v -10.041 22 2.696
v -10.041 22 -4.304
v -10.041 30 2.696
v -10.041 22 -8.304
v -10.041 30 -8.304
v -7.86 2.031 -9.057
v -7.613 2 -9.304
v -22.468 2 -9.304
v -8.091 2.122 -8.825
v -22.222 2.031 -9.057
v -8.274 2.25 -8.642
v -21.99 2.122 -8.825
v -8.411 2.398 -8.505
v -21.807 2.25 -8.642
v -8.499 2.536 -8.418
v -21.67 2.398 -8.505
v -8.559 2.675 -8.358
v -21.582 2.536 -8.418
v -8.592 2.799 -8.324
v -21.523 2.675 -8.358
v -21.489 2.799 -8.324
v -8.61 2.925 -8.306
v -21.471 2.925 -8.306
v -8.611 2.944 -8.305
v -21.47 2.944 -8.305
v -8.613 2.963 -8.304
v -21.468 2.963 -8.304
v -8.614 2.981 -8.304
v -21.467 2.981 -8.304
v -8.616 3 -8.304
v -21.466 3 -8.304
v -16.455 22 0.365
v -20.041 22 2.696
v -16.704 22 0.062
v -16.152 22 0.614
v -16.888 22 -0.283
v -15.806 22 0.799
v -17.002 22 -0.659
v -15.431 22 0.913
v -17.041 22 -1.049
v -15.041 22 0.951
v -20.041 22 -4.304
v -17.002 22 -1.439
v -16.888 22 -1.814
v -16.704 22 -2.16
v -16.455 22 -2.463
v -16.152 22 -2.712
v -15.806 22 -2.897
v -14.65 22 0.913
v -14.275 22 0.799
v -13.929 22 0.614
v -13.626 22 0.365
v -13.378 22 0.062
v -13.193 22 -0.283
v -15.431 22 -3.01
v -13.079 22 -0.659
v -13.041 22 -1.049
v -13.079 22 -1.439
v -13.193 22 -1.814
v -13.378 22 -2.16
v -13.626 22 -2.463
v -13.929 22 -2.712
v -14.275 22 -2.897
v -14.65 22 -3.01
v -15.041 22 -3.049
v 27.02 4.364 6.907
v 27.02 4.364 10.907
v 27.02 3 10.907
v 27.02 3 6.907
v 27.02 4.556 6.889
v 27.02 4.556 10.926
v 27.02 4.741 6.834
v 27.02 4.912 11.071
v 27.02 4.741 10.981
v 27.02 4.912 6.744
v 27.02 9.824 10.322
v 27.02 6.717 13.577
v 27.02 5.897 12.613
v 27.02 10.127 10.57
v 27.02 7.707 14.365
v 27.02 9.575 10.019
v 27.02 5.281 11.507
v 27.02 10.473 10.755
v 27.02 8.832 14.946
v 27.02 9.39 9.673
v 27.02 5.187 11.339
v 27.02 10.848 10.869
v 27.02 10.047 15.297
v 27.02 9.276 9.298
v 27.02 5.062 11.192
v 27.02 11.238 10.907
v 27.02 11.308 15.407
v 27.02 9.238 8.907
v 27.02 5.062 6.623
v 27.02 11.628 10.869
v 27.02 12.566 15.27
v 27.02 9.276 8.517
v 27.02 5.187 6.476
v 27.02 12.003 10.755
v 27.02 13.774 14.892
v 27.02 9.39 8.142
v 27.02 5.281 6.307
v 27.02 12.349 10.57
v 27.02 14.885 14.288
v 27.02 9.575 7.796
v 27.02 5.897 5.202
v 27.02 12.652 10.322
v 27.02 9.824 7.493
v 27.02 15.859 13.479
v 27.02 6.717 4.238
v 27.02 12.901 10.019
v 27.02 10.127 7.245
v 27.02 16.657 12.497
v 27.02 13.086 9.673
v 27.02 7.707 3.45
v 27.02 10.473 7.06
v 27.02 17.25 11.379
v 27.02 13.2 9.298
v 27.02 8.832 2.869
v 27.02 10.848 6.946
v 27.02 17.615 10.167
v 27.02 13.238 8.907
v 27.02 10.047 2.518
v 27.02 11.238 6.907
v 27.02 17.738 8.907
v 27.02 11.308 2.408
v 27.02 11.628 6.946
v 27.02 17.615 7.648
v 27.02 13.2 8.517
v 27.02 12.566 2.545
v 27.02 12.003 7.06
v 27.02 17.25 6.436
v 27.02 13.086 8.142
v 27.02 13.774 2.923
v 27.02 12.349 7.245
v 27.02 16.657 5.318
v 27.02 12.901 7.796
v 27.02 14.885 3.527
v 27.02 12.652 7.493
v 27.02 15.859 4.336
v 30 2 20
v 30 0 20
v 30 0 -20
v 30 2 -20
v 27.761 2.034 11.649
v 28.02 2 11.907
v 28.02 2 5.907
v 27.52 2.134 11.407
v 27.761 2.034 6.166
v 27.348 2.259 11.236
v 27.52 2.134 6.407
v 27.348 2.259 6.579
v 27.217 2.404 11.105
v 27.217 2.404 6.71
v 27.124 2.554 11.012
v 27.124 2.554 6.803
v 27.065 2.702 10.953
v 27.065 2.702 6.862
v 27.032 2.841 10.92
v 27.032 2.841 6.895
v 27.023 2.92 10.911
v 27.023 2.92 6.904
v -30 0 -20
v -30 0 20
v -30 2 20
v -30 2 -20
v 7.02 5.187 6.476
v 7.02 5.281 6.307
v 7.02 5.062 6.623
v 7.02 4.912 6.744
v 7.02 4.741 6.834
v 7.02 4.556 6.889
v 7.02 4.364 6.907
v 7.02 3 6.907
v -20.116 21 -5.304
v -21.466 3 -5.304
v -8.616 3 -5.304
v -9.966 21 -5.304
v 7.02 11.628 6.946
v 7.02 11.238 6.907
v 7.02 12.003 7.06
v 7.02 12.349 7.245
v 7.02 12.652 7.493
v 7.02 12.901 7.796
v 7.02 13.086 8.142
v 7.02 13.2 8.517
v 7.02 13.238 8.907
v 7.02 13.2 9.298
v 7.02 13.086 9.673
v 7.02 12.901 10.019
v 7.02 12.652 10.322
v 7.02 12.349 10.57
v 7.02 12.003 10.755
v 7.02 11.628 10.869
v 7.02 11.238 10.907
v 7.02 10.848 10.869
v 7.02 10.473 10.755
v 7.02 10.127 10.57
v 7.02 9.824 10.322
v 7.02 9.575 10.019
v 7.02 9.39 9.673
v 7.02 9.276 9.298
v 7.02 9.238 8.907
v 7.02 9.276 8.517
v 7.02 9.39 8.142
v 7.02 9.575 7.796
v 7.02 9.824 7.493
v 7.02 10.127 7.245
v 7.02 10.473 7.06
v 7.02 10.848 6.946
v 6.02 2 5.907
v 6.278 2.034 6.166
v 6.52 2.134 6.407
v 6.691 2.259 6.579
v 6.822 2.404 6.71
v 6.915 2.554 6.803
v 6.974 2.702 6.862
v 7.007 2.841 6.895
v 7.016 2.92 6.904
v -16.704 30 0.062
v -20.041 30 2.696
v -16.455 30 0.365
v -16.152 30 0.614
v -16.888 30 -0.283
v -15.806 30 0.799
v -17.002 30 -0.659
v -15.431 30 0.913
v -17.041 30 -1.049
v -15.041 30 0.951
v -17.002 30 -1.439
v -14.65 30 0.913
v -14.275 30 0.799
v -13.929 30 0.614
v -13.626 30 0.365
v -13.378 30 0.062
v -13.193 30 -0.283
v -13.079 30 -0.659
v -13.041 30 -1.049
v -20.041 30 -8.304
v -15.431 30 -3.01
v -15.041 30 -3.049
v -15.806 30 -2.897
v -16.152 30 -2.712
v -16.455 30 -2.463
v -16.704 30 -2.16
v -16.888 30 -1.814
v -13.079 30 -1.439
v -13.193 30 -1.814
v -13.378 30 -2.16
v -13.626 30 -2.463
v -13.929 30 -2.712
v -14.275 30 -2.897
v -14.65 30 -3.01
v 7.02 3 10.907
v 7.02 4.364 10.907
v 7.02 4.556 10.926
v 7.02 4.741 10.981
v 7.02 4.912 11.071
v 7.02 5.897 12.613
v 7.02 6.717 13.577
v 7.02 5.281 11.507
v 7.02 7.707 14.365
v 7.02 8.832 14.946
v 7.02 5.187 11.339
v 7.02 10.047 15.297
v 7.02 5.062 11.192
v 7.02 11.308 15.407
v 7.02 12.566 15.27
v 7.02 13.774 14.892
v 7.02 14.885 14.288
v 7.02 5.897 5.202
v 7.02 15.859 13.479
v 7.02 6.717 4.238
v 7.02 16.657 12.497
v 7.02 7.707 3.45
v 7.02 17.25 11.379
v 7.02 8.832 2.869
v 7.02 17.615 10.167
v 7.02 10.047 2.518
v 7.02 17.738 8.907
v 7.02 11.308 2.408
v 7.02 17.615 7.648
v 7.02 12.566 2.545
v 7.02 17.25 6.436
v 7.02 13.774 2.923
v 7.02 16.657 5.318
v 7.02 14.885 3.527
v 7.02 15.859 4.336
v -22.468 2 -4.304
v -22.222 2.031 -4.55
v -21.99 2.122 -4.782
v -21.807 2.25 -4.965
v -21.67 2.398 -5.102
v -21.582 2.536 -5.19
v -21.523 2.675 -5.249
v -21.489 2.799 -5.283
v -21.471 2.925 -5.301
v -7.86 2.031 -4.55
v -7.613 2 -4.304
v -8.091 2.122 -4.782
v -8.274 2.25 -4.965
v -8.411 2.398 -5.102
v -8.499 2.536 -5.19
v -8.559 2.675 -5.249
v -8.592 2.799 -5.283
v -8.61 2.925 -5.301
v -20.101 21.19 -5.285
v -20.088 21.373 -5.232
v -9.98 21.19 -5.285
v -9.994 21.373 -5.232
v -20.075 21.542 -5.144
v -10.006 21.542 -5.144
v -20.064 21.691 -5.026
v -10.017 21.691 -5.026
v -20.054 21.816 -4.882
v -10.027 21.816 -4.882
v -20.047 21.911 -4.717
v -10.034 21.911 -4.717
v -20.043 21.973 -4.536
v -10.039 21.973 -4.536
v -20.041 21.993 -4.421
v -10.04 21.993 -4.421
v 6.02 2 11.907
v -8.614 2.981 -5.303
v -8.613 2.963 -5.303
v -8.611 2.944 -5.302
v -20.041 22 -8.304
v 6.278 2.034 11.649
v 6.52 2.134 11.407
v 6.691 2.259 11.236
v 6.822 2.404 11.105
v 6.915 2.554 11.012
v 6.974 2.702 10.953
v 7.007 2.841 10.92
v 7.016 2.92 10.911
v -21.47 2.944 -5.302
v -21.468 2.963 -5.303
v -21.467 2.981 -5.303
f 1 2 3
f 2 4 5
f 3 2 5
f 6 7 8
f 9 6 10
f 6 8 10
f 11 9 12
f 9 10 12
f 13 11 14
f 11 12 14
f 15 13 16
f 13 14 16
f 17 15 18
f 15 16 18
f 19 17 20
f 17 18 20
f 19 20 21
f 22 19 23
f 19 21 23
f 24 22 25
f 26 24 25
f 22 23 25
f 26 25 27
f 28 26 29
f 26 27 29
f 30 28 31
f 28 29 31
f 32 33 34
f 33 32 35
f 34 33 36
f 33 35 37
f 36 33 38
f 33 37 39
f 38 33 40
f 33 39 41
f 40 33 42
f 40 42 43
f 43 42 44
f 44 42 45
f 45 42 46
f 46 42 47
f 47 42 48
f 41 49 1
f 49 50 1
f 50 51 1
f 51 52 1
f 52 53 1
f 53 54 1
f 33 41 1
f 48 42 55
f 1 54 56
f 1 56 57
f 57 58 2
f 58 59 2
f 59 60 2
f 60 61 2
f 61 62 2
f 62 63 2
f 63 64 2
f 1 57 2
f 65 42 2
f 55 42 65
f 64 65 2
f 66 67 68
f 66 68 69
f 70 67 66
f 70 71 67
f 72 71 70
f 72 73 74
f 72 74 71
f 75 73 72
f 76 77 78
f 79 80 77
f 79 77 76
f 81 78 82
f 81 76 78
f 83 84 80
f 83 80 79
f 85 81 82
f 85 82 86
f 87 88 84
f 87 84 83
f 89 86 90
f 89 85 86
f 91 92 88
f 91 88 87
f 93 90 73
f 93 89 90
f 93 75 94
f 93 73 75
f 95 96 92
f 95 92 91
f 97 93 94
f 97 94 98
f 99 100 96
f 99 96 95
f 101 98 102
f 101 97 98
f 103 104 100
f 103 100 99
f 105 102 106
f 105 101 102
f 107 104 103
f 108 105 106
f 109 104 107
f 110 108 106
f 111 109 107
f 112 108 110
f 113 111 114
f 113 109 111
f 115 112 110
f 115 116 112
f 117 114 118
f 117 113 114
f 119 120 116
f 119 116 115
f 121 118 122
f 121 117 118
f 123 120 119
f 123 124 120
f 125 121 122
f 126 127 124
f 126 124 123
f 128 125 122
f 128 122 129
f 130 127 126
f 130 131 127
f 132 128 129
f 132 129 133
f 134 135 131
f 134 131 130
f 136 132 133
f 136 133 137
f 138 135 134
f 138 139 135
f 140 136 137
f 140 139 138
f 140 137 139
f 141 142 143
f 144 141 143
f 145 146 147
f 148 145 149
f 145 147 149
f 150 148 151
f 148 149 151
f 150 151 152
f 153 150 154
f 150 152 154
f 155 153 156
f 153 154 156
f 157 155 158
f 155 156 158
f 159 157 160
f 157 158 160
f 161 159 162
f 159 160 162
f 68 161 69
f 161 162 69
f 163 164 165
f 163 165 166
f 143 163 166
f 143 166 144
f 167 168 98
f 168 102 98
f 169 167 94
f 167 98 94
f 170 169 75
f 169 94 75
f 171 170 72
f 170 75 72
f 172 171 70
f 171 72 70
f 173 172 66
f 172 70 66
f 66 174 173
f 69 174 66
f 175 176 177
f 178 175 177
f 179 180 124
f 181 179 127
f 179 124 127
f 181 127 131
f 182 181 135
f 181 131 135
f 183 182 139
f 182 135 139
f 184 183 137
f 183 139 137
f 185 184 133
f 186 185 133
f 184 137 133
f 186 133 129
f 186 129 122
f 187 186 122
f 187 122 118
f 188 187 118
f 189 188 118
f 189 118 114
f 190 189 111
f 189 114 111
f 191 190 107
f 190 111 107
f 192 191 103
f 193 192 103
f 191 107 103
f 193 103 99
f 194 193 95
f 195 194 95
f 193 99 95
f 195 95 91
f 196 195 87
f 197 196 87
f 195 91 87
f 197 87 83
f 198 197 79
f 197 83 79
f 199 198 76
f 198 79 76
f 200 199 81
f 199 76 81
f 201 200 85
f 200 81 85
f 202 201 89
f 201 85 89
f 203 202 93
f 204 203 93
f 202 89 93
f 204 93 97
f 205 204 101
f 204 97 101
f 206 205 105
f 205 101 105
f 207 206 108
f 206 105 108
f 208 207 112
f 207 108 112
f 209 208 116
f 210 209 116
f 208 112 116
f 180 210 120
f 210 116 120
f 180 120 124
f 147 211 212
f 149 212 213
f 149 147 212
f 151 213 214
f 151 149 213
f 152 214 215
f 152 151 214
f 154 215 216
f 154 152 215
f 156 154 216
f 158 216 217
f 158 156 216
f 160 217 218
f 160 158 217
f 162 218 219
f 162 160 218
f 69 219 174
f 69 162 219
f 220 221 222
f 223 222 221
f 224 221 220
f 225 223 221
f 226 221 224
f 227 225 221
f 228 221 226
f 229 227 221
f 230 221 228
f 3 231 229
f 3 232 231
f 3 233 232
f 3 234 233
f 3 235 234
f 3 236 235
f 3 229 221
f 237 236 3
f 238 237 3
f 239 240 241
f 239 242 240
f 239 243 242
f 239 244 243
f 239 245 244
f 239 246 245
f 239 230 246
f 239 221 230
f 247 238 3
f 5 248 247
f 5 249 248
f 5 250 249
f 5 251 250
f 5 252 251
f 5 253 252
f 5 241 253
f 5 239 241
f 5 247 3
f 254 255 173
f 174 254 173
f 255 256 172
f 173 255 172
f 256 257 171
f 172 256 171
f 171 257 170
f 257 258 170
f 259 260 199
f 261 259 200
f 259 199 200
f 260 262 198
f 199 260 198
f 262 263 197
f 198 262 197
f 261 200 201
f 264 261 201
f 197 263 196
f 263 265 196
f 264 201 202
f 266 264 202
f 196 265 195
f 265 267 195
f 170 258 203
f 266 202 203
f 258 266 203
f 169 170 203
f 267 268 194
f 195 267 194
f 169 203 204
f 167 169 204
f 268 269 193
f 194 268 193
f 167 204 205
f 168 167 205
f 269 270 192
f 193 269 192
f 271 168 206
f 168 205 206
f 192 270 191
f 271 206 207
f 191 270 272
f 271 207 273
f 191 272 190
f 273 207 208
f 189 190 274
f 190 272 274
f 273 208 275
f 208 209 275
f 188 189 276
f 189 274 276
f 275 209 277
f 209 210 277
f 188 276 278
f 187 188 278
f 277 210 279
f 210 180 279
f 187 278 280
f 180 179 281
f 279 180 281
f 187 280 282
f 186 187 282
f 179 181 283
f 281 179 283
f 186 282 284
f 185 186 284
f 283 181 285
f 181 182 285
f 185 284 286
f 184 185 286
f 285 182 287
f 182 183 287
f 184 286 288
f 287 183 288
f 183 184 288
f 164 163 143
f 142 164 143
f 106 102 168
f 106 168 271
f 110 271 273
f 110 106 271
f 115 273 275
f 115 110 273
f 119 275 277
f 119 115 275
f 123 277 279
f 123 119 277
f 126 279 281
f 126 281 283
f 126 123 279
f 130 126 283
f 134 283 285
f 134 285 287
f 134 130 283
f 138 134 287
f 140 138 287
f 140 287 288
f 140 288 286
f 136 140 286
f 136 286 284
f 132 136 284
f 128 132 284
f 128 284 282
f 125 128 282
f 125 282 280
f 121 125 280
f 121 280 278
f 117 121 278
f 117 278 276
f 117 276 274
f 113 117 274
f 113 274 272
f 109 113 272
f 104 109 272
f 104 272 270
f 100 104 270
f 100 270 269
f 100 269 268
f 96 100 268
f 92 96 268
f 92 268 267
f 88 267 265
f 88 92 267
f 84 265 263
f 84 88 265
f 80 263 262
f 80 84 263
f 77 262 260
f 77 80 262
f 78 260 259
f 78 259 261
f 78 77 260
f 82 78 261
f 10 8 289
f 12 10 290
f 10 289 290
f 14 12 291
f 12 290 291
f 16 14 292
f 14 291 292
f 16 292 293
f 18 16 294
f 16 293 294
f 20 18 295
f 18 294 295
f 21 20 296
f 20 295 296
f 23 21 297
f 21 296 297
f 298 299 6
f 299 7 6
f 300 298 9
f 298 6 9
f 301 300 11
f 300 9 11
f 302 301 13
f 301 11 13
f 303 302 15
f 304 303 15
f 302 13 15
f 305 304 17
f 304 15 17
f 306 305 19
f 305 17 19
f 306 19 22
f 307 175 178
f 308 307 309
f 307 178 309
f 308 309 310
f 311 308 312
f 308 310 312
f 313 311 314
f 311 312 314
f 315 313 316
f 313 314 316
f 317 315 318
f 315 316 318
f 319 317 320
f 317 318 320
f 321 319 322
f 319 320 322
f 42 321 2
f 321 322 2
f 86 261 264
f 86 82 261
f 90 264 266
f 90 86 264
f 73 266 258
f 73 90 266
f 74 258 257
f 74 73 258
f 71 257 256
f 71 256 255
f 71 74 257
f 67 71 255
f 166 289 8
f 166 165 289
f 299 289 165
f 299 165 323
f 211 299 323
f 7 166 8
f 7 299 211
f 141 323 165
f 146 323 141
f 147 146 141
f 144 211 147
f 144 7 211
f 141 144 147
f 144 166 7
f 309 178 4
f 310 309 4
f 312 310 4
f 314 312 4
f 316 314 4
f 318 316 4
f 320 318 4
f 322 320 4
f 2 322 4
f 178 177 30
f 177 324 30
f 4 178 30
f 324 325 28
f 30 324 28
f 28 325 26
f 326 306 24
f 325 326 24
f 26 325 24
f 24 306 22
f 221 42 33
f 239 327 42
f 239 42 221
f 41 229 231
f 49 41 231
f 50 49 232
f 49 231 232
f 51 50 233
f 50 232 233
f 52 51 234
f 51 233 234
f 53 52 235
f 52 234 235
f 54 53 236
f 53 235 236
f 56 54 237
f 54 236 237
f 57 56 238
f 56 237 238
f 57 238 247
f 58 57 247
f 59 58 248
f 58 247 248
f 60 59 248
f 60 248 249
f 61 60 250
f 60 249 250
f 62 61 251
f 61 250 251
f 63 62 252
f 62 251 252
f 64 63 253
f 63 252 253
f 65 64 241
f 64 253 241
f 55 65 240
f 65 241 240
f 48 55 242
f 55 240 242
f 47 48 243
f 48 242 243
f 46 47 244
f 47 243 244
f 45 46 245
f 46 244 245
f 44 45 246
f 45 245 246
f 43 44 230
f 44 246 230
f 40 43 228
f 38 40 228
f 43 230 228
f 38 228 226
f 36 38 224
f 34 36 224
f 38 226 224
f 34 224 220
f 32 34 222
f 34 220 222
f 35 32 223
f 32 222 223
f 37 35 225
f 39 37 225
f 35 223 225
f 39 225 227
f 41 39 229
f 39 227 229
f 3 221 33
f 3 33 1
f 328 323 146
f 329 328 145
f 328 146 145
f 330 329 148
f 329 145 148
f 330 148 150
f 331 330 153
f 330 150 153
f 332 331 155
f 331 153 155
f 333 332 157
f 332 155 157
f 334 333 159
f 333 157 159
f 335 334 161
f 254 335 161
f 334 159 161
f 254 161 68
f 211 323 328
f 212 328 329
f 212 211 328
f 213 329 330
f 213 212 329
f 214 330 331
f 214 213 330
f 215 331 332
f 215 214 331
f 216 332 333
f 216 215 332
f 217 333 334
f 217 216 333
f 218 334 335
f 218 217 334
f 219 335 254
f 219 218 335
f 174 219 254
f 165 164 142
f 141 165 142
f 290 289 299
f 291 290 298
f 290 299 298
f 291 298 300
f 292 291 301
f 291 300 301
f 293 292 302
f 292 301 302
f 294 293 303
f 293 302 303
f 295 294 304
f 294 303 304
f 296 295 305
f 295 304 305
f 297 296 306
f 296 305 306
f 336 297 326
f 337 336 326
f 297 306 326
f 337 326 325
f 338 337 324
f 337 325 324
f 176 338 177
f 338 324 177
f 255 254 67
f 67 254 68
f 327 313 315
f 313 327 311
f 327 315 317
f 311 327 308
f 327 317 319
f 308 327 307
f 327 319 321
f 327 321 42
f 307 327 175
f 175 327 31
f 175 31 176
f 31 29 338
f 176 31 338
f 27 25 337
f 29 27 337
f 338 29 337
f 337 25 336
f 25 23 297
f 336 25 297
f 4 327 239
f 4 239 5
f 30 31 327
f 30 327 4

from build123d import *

# Parameters (mm, degrees)
SKETCH1_W           = 60
SKETCH1_H           = 40
BOSS_EXTRUDE1_DEPTH = 2
SKETCH4_W           = 10
SKETCH4_H           = 3
BOSS_EXTRUDE2_DEPTH = 8
SKETCH6_W           = 10
SKETCH6_H           = 8
BOSS_EXTRUDE5_DEPTH = 8
SKETCH8_R           = 2
CUT_EXTRUDE2_DEPTH  = 8
SKETCH9_W           = 20
SKETCH9_H           = 4
BOSS_EXTRUDE6_DEPTH = 4
SKETCH10_R          = 6.5
SKETCH10_R_2        = 2
BOSS_EXTRUDE7_DEPTH = 20
FILLET1_R           = 1
FILLET2_R           = 1
FILLET3_R           = 1


with BuildPart() as part:
    # Sketch1 → Boss-Extrude1 (new body)
    with BuildSketch(Plane(origin=(0, 0, 0), x_dir=(1, 0, 0), z_dir=(0, 1, 0))):
        Rectangle(SKETCH1_W, SKETCH1_H)
    extrude(amount=BOSS_EXTRUDE1_DEPTH)

    # Sketch3 → Loft1 section 0
    with BuildSketch(Plane(origin=(0, 22, 0), x_dir=(1, 0, 0), z_dir=(0, 1, 0))):
        with BuildLine():
            Line((-20.040616465, 5.303560218), (-10.040616465, 5.303560218))
            Line((-10.040616465, 5.303560218), (-10.040616465, 8.303560218))
            Line((-10.040616465, 8.303560218), (-20.040616465, 8.303560218))
            Line((-20.040616465, 8.303560218), (-20.040616465, 5.303560218))
        make_face()
    # Sketch2 → Loft1 section 1
    with BuildSketch(Plane(origin=(0, 2, 0), x_dir=(1, 0, 0), z_dir=(0, 1, 0))):
        with BuildLine():
            Line((-21.540616465, 5.303560218), (-8.540616465, 5.303560218))
            Line((-8.540616465, 5.303560218), (-8.540616465, 8.303560218))
            Line((-8.540616465, 8.303560218), (-21.540616465, 8.303560218))
            Line((-21.540616465, 8.303560218), (-21.540616465, 5.303560218))
        make_face()
    loft()

    # Sketch4 → Boss-Extrude2 (add)
    with BuildSketch(Plane(origin=(0, 22, 0), x_dir=(1, 0, 0), z_dir=(0, 1, 0))):
        with Locations((-15.040616465, 6.803560218)):
            Rectangle(SKETCH4_W, SKETCH4_H)
    extrude(amount=BOSS_EXTRUDE2_DEPTH)

    # Sketch6 → Boss-Extrude5 (add)
    with BuildSketch(Plane.XY.offset(-5.303560218)):
        with Locations((-15.040616465, 26)):
            Rectangle(SKETCH6_W, SKETCH6_H)
    extrude(amount=BOSS_EXTRUDE5_DEPTH)

    # Sketch8 → Cut-Extrude2 (cut)
    with BuildSketch(Plane(origin=(0, 30, 0), x_dir=(1, 0, 0), z_dir=(0, 1, 0))):
        with Locations(Location((-15.040616465, 1.048838028, 0), (0, 0, 270))):
            Circle(SKETCH8_R)
    extrude(amount=-CUT_EXTRUDE2_DEPTH, mode=Mode.SUBTRACT)

    # Sketch9 → Boss-Extrude6 (add)
    with BuildSketch(Plane(origin=(0, 2, 0), x_dir=(1, 0, 0), z_dir=(0, 1, 0))):
        with Locations((17.019567568, -8.907492708)):
            Rectangle(SKETCH9_W, SKETCH9_H)
    extrude(amount=BOSS_EXTRUDE6_DEPTH)

    # Sketch10 → Boss-Extrude7 (add)
    with BuildSketch(Plane(origin=(27.019567568, 0, 0), x_dir=(0, 0, -1), z_dir=(1, 0, 0))):
        with Locations((-8.907492708, 11.238036321)):
            Circle(SKETCH10_R)
        with Locations((-8.907492708, 11.238036321)):
            Circle(SKETCH10_R_2, mode=Mode.SUBTRACT)
    extrude(amount=-BOSS_EXTRUDE7_DEPTH)

    # Fillet1
    fillet1_edges = [part.edges().sort_by_distance(p)[0] for p in [
        (-21.540616465, 2, -6.803560218),
        (-15.040616465, 2, -5.303560218),
        (-15.040616465, 2, -8.303560218),
        (-8.540616465, 2, -6.803560218),
    ]]
    fillet(fillet1_edges, radius=FILLET1_R)

    # Fillet2
    fillet2_edges = [part.edges().sort_by_distance(p)[0] for p in [
        (-15.040616465, 22, -5.303560218),
    ]]
    fillet(fillet2_edges, radius=FILLET2_R)

    # Fillet3
    fillet3_edges = [part.edges().sort_by_distance(p)[0] for p in [
        (17.019567568, 2, 10.907492708),
        (27.019567568, 2, 8.907492708),
        (7.019567568, 2, 8.907492708),
        (17.019567568, 2, 6.907492708),
        (17.019567568, 5.053377883, 6.907492708),
        (17.019567568, 5.053377883, 10.907492708),
    ]]
    fillet(fillet3_edges, radius=FILLET3_R)


solid = part.part
